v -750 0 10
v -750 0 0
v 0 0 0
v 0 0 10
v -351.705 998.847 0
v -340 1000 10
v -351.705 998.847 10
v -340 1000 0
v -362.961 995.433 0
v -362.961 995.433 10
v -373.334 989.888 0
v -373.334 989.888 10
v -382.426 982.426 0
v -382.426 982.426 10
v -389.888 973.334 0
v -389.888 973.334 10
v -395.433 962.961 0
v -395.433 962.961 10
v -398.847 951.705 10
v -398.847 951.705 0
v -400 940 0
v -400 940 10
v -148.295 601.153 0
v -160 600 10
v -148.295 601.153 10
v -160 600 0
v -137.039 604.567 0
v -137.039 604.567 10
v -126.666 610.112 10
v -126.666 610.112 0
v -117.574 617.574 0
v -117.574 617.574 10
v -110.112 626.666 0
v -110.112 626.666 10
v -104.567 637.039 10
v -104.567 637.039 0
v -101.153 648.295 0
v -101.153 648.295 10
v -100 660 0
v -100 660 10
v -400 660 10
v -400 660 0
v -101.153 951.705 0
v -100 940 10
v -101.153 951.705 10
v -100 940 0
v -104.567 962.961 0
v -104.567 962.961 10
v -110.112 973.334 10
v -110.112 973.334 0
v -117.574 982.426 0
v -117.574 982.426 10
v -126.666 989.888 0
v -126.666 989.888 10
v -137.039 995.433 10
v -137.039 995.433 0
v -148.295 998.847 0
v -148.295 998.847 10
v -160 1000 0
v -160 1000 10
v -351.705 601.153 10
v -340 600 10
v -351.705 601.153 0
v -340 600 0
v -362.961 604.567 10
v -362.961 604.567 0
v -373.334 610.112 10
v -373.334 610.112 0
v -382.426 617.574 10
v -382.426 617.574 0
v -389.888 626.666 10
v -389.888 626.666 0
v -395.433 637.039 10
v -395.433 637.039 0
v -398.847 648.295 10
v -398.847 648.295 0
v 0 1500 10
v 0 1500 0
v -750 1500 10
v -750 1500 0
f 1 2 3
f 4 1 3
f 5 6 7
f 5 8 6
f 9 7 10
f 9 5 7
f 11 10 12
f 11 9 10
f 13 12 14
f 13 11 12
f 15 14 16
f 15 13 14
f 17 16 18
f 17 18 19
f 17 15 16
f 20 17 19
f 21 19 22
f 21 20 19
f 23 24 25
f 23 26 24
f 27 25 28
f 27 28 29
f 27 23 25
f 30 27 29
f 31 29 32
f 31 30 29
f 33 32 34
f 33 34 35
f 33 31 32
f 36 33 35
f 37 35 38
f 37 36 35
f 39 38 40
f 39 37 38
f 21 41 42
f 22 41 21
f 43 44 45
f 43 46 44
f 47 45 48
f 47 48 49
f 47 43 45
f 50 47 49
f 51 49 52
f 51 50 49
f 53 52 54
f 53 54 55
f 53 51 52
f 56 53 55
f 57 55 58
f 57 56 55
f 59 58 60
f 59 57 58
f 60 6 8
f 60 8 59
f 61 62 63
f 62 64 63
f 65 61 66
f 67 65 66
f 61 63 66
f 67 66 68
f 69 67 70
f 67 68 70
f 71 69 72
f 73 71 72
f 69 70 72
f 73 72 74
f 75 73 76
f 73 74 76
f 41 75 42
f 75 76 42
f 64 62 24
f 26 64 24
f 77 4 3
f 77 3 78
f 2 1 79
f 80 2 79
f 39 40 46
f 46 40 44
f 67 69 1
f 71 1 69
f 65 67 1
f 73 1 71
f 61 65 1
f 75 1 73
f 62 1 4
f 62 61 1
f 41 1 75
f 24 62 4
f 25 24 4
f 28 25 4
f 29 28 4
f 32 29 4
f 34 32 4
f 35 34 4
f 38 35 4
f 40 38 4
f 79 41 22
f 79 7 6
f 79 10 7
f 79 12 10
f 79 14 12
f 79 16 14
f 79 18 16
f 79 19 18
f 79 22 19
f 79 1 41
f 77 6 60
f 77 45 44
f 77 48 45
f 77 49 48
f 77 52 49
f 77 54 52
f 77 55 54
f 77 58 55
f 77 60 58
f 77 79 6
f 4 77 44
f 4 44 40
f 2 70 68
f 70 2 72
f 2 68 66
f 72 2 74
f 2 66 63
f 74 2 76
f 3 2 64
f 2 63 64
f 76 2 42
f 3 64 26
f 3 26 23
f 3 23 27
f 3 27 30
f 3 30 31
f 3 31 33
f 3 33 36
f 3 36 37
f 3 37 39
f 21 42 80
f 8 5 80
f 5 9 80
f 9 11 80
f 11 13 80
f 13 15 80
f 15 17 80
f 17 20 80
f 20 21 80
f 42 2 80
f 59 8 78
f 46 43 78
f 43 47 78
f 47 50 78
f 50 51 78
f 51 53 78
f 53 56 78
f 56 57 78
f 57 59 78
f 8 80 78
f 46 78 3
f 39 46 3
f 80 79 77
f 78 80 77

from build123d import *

# Parameters (mm, degrees)
F0_W     = 750
F0_H     = 1100
F1_DEPTH = 10
F2_W     = 750
F2_H     = 400
F3_DEPTH = 10
F4_W     = 300
F4_H     = 400
F5_DEPTH = 25
F6_R     = 60


with BuildPart() as f1:
    # F0 (on Top) → F1 (new body)
    with BuildSketch(Plane.XY):
        with Locations((-375, 550)):
            Rectangle(F0_W, F0_H)
    extrude(amount=F1_DEPTH)

    # F2 (on face) → F3 (join)
    with BuildSketch(Plane.XY.offset(10)):
        with Locations((-375, 1300)):
            Rectangle(F2_W, F2_H)
    extrude(amount=-F3_DEPTH)

    # F4 (on face) → F5 (cut)
    with BuildSketch(Plane.XY.offset(10)):
        with Locations((-250, 800)):
            Rectangle(F4_W, F4_H)
    extrude(amount=-F5_DEPTH, mode=Mode.SUBTRACT)

    # F6
    f6_edges = [f1.edges().sort_by_distance(p)[0] for p in [
        (-400, 1000, 5),
        (-400, 600, 5),
        (-100, 1000, 5),
        (-100, 600, 5),
    ]]
    fillet(f6_edges, radius=F6_R)


solid = f1.part
